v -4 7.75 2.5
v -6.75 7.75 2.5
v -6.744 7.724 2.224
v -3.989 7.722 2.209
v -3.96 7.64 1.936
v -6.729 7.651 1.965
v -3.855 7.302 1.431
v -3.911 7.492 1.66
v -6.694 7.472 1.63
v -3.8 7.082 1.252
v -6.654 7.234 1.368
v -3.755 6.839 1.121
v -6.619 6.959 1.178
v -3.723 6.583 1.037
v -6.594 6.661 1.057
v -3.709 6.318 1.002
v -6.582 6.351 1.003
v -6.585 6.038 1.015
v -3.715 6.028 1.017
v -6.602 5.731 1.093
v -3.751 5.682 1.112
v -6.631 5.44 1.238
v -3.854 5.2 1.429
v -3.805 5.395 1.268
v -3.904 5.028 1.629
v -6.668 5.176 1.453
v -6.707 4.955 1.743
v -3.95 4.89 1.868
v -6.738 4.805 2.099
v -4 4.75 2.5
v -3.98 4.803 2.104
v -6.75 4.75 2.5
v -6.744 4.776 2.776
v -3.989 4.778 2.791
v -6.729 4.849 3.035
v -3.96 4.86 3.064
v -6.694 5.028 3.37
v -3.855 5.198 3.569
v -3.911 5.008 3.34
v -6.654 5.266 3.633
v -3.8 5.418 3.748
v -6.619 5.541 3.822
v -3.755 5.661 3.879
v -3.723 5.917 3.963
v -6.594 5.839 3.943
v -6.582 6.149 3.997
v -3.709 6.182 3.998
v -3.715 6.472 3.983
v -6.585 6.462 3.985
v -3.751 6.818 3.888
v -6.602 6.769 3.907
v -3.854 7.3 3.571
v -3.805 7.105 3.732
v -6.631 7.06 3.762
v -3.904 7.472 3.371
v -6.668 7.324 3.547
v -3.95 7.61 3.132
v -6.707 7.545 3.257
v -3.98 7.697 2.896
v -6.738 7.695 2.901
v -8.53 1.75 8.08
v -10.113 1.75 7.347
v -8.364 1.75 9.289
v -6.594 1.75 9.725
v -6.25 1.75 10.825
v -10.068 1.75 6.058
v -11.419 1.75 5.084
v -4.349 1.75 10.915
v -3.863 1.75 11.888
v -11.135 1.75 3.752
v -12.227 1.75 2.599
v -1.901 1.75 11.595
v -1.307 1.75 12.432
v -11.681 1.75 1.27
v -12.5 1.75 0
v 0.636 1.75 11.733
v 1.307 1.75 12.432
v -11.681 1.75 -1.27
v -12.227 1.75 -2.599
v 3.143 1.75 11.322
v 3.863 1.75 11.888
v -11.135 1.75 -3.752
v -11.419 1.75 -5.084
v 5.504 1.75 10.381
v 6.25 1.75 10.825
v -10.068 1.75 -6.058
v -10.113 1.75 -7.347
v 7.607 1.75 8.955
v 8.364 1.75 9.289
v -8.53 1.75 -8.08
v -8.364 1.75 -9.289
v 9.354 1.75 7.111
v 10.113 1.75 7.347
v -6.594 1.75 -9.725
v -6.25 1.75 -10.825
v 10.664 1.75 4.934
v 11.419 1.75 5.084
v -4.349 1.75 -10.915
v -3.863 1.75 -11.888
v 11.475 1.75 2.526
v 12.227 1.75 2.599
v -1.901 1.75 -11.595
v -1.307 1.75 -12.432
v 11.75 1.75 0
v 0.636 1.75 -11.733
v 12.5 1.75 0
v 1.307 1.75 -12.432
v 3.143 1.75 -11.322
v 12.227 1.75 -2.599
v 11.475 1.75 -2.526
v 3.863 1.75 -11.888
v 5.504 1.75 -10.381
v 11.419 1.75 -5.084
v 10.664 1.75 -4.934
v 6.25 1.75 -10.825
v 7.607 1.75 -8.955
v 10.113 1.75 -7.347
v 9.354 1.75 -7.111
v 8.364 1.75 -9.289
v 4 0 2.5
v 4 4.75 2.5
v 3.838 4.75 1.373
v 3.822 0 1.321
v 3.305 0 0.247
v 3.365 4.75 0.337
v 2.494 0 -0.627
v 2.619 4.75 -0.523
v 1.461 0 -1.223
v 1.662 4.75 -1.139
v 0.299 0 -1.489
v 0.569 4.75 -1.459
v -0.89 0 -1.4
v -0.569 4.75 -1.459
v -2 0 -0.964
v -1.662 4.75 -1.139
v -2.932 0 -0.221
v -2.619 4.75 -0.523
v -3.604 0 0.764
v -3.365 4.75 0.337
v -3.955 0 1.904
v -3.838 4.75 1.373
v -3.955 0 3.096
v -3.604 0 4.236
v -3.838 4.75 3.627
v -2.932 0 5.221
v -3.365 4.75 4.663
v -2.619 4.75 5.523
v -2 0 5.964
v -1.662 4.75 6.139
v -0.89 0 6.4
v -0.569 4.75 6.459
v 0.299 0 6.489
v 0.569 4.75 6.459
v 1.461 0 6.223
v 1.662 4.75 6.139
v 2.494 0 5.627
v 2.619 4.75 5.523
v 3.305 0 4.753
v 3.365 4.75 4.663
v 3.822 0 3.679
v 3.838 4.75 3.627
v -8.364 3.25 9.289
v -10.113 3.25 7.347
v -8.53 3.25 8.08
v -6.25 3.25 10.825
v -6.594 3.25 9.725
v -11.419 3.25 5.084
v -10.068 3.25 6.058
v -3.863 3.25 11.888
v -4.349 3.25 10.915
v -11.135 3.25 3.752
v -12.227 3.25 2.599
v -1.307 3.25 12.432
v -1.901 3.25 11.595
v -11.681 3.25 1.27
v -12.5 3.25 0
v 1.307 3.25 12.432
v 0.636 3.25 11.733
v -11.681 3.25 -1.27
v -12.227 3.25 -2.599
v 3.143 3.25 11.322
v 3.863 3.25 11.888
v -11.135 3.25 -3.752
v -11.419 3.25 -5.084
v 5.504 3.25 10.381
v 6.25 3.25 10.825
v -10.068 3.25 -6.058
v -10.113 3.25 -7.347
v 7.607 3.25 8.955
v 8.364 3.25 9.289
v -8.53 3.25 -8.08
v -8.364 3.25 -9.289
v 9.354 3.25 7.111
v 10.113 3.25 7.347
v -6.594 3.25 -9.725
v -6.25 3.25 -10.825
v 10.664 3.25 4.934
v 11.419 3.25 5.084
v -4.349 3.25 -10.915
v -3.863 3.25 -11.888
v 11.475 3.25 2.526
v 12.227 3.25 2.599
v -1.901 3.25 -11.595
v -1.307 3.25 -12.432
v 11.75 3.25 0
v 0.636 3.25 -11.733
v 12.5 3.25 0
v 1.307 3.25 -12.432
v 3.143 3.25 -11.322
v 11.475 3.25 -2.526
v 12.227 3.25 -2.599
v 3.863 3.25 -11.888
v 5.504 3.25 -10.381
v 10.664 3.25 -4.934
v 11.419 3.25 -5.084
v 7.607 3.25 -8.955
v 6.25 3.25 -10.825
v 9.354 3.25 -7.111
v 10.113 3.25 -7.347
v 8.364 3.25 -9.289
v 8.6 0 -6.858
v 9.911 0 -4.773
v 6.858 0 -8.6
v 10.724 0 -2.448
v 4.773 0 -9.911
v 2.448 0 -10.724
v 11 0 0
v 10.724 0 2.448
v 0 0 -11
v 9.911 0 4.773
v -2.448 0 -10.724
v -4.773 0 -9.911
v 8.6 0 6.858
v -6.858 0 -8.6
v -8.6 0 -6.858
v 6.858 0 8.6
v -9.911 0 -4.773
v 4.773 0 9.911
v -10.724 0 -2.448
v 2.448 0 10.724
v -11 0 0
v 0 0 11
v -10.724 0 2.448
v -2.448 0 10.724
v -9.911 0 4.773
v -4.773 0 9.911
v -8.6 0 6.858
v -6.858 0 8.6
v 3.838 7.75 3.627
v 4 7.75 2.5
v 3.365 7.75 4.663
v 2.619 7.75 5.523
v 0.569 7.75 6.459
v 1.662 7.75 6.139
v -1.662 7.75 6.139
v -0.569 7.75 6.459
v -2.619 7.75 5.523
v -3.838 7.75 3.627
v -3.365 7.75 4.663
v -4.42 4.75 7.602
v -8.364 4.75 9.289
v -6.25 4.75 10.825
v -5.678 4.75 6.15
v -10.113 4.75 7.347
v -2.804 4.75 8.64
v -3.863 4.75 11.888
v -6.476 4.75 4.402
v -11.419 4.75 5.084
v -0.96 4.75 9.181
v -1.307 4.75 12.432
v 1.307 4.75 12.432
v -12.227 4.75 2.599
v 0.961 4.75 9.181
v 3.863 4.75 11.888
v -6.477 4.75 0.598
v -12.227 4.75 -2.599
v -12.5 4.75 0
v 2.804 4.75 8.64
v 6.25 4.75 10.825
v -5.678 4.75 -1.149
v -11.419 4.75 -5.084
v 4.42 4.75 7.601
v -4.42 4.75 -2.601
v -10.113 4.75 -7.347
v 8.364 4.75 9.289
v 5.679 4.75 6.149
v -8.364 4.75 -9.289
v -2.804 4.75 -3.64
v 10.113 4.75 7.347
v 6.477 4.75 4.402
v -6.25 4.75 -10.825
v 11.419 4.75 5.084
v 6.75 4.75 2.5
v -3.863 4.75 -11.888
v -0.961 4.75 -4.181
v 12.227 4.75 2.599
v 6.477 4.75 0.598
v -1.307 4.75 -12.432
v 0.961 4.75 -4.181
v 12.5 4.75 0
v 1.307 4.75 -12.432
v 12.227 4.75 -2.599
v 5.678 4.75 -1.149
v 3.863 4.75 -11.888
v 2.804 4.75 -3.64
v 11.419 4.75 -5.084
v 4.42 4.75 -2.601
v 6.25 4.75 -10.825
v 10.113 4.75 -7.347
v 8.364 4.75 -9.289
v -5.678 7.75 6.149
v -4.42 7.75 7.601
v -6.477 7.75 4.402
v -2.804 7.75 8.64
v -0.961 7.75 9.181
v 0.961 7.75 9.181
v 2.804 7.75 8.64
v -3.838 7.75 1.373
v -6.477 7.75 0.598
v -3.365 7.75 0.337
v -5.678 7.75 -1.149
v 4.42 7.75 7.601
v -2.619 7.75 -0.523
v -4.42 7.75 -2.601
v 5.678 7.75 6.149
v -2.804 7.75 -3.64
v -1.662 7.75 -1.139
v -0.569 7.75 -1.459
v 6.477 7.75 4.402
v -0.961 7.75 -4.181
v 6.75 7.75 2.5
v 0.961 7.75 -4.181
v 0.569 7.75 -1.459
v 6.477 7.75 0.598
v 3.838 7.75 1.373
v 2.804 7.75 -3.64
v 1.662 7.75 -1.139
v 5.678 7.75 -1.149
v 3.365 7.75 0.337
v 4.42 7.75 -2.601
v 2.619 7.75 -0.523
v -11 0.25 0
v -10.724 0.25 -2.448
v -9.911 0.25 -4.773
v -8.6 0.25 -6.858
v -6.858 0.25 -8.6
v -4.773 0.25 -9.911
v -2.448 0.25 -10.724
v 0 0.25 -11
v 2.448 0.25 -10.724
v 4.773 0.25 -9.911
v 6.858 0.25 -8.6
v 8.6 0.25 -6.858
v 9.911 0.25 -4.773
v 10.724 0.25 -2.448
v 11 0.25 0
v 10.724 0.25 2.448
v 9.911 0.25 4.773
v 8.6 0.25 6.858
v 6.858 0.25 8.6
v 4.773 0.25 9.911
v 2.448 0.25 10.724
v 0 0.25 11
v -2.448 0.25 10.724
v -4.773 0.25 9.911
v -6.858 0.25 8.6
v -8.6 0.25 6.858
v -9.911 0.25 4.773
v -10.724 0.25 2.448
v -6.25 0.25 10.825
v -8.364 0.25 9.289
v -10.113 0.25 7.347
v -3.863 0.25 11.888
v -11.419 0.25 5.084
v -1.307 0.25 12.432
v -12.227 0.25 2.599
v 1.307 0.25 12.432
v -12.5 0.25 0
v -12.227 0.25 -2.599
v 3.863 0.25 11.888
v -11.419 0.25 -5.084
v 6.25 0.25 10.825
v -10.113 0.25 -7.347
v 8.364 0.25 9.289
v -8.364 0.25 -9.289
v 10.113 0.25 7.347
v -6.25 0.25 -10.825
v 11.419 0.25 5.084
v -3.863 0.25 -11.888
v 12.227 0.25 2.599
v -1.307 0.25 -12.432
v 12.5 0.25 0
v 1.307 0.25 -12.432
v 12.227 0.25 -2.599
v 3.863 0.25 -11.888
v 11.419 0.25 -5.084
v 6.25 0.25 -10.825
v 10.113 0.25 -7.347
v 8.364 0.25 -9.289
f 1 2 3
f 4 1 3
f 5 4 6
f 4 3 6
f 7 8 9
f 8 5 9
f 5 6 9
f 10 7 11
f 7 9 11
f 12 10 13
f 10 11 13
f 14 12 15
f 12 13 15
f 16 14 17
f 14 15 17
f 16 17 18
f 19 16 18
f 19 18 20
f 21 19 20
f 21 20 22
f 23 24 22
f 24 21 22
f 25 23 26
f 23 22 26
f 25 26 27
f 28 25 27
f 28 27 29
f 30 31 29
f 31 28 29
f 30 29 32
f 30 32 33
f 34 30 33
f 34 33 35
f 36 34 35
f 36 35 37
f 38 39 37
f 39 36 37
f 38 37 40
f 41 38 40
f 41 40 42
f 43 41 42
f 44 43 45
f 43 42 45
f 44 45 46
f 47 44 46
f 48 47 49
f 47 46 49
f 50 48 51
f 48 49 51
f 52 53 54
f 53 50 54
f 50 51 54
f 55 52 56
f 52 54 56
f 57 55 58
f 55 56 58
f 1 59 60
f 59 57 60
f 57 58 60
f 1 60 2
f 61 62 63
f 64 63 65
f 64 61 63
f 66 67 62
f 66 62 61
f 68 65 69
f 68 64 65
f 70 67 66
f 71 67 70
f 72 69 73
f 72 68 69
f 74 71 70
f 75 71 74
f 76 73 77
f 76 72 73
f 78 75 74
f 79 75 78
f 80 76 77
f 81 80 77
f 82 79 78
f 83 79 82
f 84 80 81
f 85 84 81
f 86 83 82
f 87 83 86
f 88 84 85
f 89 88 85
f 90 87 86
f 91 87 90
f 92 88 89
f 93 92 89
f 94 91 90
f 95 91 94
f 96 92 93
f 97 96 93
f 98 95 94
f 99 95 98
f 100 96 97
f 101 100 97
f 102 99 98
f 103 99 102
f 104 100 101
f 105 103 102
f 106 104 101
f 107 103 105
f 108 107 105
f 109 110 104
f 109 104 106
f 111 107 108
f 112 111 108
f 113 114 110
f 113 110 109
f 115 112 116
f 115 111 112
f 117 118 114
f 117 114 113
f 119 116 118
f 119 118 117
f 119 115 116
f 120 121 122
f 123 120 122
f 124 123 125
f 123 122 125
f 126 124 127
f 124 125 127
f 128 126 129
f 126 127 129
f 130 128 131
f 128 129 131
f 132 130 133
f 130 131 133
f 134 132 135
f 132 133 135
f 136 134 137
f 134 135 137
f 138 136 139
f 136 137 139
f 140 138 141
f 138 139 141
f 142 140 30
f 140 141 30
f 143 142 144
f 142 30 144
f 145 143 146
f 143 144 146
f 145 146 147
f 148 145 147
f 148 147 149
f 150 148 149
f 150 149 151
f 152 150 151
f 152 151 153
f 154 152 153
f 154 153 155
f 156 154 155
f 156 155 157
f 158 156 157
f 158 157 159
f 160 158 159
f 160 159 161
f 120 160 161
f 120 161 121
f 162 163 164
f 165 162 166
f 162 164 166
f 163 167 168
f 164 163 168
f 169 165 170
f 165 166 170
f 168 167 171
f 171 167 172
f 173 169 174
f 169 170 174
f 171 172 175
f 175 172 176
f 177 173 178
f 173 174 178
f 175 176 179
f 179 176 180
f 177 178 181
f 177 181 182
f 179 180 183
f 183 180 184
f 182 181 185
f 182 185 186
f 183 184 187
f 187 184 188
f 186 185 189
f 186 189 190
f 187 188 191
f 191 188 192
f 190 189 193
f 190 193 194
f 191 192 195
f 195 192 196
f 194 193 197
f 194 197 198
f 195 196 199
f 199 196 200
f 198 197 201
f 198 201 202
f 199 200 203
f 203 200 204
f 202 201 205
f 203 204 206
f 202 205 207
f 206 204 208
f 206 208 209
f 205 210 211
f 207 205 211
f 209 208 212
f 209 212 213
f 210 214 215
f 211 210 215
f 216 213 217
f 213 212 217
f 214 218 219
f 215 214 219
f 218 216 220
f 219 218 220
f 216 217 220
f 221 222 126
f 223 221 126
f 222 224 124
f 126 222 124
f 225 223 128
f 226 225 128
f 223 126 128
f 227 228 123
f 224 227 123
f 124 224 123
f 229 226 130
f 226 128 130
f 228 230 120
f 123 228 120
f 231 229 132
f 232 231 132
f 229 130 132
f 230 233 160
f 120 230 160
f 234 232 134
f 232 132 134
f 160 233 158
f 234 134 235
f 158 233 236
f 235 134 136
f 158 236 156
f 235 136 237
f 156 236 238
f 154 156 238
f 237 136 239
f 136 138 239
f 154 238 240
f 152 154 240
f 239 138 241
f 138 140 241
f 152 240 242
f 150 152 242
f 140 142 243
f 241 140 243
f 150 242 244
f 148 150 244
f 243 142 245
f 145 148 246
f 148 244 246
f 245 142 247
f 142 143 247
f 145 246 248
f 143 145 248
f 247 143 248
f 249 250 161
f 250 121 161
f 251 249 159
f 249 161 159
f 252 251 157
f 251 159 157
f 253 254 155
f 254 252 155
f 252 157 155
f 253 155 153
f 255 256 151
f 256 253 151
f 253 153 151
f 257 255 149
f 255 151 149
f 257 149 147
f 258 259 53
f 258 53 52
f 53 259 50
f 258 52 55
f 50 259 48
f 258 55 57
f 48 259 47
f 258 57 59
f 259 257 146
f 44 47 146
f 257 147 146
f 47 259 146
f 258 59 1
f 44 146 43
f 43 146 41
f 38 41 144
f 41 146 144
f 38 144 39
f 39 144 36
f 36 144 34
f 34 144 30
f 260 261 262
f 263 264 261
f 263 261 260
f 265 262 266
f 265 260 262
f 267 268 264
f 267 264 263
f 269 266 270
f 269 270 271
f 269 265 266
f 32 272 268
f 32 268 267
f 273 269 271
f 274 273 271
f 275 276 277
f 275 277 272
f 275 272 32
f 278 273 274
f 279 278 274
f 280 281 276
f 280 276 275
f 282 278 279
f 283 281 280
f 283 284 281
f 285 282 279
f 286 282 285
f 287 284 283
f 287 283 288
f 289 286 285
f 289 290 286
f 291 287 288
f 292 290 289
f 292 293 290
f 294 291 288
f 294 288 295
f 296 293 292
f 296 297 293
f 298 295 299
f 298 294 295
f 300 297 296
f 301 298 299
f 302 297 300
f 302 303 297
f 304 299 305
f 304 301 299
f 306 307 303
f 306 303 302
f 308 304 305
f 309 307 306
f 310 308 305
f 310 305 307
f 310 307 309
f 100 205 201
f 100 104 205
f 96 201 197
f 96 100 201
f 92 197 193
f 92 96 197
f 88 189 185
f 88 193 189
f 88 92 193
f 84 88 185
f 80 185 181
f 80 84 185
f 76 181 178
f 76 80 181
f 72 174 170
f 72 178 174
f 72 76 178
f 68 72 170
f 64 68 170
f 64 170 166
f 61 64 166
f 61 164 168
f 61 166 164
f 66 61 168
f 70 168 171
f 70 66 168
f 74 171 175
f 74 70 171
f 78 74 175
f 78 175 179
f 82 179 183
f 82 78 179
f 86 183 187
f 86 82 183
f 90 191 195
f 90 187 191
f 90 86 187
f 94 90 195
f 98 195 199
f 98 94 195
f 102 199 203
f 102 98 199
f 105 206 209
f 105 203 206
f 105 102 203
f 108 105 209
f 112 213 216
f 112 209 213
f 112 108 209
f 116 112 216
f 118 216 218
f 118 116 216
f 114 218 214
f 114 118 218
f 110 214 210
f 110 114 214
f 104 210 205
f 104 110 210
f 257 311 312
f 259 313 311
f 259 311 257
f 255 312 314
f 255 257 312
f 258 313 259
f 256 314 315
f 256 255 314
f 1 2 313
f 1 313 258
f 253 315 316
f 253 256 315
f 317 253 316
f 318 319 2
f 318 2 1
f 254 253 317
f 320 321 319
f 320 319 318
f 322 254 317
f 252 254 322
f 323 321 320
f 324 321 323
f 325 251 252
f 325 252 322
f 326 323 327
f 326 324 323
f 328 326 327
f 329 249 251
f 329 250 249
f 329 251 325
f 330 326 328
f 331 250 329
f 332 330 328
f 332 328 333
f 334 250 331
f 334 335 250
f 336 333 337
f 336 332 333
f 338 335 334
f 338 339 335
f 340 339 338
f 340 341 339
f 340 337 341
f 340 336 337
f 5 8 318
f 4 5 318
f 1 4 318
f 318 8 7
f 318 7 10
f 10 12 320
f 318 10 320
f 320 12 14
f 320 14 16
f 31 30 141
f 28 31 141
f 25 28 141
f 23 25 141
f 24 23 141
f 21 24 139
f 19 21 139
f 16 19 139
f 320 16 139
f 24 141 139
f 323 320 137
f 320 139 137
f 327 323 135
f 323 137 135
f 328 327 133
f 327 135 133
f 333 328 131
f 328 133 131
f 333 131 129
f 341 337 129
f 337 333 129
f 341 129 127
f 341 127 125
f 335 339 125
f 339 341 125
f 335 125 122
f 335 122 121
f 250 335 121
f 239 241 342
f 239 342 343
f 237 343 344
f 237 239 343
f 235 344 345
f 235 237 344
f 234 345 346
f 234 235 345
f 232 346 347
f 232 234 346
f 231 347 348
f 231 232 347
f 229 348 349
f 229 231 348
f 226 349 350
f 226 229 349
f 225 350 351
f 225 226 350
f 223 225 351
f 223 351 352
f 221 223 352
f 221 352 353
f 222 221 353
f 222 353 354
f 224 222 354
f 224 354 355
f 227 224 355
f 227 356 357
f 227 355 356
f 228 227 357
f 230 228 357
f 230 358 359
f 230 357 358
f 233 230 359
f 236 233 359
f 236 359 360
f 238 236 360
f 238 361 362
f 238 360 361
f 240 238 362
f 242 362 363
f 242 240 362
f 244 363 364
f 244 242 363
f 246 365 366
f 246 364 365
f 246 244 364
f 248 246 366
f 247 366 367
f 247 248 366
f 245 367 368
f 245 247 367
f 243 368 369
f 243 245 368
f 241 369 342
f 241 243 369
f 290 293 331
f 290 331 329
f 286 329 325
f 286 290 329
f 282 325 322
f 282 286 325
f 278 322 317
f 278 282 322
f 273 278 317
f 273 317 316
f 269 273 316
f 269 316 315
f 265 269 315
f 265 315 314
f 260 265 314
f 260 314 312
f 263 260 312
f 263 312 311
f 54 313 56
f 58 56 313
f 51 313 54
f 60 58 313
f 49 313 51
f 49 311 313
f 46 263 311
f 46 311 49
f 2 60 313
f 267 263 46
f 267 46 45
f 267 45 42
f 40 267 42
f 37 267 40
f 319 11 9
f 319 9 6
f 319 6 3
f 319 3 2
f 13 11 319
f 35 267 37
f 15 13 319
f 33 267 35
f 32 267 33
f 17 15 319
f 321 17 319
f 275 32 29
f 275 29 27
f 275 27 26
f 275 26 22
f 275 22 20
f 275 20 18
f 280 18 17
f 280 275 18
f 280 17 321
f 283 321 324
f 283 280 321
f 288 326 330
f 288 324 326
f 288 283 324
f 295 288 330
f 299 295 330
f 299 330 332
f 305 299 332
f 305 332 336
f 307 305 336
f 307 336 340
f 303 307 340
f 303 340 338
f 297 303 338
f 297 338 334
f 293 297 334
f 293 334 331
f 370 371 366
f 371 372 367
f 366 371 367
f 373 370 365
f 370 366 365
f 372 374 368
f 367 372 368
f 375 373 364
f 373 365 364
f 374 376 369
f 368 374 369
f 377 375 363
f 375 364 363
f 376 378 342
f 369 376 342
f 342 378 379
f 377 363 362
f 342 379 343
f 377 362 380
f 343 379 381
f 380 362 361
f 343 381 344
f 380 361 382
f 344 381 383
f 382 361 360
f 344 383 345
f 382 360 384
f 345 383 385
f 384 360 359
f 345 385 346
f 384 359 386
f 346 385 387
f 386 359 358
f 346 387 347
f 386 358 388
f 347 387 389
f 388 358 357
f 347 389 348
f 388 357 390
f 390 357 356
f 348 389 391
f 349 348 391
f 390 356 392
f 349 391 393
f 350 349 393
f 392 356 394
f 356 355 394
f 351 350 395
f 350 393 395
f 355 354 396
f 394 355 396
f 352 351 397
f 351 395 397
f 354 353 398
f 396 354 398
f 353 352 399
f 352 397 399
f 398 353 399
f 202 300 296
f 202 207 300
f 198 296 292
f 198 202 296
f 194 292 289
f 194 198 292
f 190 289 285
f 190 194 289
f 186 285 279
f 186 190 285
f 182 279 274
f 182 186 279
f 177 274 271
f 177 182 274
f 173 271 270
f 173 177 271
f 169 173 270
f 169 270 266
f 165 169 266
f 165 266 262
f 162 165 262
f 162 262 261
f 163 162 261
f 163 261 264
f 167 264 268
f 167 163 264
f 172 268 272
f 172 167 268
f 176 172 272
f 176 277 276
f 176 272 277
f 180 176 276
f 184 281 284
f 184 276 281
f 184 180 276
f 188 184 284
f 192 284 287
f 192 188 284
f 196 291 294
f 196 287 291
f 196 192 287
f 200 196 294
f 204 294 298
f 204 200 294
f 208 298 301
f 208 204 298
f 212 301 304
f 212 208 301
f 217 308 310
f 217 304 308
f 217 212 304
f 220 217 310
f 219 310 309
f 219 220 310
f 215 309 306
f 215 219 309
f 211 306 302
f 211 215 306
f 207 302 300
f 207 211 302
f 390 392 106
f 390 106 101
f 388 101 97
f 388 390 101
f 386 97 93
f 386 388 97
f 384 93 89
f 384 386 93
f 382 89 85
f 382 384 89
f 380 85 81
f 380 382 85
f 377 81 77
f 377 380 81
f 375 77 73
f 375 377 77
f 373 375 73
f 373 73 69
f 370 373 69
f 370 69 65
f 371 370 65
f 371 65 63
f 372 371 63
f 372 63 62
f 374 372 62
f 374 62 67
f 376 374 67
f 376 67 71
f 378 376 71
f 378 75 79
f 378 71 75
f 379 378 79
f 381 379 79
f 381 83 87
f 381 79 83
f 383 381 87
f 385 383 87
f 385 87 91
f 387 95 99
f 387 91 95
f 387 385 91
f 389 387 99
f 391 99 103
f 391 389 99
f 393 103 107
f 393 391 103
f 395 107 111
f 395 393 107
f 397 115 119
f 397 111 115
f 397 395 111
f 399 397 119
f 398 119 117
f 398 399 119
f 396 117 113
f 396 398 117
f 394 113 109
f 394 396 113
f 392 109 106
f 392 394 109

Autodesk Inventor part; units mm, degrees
ref_plane "XZ Plane" through (0, 0, 0) normal (0, 1, 0) x (-1, 0, 0)
ref_plane "XY Plane" through (0, 0, 0) normal (0, 0, 1) x (1, 0, 0)
sketch "Sketch1" plane through (0, 0, 0) normal (0, 1, 0) x (-1, 0, 0)
  circle A0 centre (0, 0) radius 11
  dimension "d0" = 22
extrude "Extrusion1" add sketch "Sketch1" along normal blind 0.25
sketch "Sketch2" plane through (0, 0.25, 0) normal (0, 1, 0) x (1, 0, 0)
  circle A0 centre (0, 0) radius 12.5
  dimension "d3" = 25
extrude "Extrusion2" add sketch "Sketch2" along normal blind 1.5
sketch "Sketch3" plane through (0, 1.75, 0) normal (0, 1, 0) x (1, 0, 0)
  circle A0 centre (0, 0) radius 11.75
  dimension "d6" = 23.5
extrude "Extrusion3" add sketch "Sketch3" along normal blind 1.5
sketch "Sketch4" plane through (0, 3.25, 0) normal (0, 1, 0) x (1, 0, 0)
  circle A0 centre (0, 0) radius 12.5
  dimension "d9" = 25
extrude "Extrusion4" add sketch "Sketch4" along normal blind 1.5
sketch "Sketch5" plane through (0, 4.75, 0) normal (0, 1, 0) x (1, 0, 0)
  line L0 (0, 0) -> (0, -2.5) construction
  circle A0 centre (0, -2.5) radius 6.75 construction
  circle A1 centre (0, -2.5) radius 6.75
  circle A2 centre (0, -2.5) radius 4
  dimension "d12" = 2.5
  dimension "d13" = 13.5
  dimension "d14" = 8
  dimension "d15" = 13.5
extrude "Extrusion5" add sketch "Sketch5" along normal blind 3
sketch "Sketch6" plane through (0, 4.75, 2.5) normal (0, 1, 0) x (1, 0, 0)
  circle A0 centre (0, 0) radius 4
  line L0 (0, 0) -> (-12.2474, 0) construction
  circle A1 centre (0, 2.5) radius 12.5 construction
  dimension "d18" = 8
  dimension "d19" = 2.5
  dimension "d20" = 12.2475
extrude "Extrusion6" cut sketch "Sketch6" against normal blind 999
ref_plane "Work Plane2" through (-10.25, 0, 0) normal (1, 0, 0) x (0, 1, 0)
sketch "Sketch8" plane through (-10.25, 0, 0) normal (1, 0, 0) x (0, 1, 0)
  line L0 (7.75, -4.25) -> (7.75, 9.25) construction
  line L1 (7.75, 0) -> (4.75, 0) construction
  line L2 (4.75, 9.25) -> (4.75, -4.25) construction
  line L3 (6.25, 0) -> (6.25, 7.0333) construction
  line L4 (7.75, 2.5) -> (4.75, 2.5) construction
  circle A0 centre (6.25, 2.5) radius 1.5
  point P0 (0, 0)
  dimension "d25" = 3
  dimension "d26" = 3
extrude "Extrusion7" cut sketch "Sketch8" along normal blind 9
thread "Thread1" size "M2.5x0.45" class "6H" standard "ANSI Metric M Profile" length 6
properties part number "eccentric" material "Aluminum 6061"
